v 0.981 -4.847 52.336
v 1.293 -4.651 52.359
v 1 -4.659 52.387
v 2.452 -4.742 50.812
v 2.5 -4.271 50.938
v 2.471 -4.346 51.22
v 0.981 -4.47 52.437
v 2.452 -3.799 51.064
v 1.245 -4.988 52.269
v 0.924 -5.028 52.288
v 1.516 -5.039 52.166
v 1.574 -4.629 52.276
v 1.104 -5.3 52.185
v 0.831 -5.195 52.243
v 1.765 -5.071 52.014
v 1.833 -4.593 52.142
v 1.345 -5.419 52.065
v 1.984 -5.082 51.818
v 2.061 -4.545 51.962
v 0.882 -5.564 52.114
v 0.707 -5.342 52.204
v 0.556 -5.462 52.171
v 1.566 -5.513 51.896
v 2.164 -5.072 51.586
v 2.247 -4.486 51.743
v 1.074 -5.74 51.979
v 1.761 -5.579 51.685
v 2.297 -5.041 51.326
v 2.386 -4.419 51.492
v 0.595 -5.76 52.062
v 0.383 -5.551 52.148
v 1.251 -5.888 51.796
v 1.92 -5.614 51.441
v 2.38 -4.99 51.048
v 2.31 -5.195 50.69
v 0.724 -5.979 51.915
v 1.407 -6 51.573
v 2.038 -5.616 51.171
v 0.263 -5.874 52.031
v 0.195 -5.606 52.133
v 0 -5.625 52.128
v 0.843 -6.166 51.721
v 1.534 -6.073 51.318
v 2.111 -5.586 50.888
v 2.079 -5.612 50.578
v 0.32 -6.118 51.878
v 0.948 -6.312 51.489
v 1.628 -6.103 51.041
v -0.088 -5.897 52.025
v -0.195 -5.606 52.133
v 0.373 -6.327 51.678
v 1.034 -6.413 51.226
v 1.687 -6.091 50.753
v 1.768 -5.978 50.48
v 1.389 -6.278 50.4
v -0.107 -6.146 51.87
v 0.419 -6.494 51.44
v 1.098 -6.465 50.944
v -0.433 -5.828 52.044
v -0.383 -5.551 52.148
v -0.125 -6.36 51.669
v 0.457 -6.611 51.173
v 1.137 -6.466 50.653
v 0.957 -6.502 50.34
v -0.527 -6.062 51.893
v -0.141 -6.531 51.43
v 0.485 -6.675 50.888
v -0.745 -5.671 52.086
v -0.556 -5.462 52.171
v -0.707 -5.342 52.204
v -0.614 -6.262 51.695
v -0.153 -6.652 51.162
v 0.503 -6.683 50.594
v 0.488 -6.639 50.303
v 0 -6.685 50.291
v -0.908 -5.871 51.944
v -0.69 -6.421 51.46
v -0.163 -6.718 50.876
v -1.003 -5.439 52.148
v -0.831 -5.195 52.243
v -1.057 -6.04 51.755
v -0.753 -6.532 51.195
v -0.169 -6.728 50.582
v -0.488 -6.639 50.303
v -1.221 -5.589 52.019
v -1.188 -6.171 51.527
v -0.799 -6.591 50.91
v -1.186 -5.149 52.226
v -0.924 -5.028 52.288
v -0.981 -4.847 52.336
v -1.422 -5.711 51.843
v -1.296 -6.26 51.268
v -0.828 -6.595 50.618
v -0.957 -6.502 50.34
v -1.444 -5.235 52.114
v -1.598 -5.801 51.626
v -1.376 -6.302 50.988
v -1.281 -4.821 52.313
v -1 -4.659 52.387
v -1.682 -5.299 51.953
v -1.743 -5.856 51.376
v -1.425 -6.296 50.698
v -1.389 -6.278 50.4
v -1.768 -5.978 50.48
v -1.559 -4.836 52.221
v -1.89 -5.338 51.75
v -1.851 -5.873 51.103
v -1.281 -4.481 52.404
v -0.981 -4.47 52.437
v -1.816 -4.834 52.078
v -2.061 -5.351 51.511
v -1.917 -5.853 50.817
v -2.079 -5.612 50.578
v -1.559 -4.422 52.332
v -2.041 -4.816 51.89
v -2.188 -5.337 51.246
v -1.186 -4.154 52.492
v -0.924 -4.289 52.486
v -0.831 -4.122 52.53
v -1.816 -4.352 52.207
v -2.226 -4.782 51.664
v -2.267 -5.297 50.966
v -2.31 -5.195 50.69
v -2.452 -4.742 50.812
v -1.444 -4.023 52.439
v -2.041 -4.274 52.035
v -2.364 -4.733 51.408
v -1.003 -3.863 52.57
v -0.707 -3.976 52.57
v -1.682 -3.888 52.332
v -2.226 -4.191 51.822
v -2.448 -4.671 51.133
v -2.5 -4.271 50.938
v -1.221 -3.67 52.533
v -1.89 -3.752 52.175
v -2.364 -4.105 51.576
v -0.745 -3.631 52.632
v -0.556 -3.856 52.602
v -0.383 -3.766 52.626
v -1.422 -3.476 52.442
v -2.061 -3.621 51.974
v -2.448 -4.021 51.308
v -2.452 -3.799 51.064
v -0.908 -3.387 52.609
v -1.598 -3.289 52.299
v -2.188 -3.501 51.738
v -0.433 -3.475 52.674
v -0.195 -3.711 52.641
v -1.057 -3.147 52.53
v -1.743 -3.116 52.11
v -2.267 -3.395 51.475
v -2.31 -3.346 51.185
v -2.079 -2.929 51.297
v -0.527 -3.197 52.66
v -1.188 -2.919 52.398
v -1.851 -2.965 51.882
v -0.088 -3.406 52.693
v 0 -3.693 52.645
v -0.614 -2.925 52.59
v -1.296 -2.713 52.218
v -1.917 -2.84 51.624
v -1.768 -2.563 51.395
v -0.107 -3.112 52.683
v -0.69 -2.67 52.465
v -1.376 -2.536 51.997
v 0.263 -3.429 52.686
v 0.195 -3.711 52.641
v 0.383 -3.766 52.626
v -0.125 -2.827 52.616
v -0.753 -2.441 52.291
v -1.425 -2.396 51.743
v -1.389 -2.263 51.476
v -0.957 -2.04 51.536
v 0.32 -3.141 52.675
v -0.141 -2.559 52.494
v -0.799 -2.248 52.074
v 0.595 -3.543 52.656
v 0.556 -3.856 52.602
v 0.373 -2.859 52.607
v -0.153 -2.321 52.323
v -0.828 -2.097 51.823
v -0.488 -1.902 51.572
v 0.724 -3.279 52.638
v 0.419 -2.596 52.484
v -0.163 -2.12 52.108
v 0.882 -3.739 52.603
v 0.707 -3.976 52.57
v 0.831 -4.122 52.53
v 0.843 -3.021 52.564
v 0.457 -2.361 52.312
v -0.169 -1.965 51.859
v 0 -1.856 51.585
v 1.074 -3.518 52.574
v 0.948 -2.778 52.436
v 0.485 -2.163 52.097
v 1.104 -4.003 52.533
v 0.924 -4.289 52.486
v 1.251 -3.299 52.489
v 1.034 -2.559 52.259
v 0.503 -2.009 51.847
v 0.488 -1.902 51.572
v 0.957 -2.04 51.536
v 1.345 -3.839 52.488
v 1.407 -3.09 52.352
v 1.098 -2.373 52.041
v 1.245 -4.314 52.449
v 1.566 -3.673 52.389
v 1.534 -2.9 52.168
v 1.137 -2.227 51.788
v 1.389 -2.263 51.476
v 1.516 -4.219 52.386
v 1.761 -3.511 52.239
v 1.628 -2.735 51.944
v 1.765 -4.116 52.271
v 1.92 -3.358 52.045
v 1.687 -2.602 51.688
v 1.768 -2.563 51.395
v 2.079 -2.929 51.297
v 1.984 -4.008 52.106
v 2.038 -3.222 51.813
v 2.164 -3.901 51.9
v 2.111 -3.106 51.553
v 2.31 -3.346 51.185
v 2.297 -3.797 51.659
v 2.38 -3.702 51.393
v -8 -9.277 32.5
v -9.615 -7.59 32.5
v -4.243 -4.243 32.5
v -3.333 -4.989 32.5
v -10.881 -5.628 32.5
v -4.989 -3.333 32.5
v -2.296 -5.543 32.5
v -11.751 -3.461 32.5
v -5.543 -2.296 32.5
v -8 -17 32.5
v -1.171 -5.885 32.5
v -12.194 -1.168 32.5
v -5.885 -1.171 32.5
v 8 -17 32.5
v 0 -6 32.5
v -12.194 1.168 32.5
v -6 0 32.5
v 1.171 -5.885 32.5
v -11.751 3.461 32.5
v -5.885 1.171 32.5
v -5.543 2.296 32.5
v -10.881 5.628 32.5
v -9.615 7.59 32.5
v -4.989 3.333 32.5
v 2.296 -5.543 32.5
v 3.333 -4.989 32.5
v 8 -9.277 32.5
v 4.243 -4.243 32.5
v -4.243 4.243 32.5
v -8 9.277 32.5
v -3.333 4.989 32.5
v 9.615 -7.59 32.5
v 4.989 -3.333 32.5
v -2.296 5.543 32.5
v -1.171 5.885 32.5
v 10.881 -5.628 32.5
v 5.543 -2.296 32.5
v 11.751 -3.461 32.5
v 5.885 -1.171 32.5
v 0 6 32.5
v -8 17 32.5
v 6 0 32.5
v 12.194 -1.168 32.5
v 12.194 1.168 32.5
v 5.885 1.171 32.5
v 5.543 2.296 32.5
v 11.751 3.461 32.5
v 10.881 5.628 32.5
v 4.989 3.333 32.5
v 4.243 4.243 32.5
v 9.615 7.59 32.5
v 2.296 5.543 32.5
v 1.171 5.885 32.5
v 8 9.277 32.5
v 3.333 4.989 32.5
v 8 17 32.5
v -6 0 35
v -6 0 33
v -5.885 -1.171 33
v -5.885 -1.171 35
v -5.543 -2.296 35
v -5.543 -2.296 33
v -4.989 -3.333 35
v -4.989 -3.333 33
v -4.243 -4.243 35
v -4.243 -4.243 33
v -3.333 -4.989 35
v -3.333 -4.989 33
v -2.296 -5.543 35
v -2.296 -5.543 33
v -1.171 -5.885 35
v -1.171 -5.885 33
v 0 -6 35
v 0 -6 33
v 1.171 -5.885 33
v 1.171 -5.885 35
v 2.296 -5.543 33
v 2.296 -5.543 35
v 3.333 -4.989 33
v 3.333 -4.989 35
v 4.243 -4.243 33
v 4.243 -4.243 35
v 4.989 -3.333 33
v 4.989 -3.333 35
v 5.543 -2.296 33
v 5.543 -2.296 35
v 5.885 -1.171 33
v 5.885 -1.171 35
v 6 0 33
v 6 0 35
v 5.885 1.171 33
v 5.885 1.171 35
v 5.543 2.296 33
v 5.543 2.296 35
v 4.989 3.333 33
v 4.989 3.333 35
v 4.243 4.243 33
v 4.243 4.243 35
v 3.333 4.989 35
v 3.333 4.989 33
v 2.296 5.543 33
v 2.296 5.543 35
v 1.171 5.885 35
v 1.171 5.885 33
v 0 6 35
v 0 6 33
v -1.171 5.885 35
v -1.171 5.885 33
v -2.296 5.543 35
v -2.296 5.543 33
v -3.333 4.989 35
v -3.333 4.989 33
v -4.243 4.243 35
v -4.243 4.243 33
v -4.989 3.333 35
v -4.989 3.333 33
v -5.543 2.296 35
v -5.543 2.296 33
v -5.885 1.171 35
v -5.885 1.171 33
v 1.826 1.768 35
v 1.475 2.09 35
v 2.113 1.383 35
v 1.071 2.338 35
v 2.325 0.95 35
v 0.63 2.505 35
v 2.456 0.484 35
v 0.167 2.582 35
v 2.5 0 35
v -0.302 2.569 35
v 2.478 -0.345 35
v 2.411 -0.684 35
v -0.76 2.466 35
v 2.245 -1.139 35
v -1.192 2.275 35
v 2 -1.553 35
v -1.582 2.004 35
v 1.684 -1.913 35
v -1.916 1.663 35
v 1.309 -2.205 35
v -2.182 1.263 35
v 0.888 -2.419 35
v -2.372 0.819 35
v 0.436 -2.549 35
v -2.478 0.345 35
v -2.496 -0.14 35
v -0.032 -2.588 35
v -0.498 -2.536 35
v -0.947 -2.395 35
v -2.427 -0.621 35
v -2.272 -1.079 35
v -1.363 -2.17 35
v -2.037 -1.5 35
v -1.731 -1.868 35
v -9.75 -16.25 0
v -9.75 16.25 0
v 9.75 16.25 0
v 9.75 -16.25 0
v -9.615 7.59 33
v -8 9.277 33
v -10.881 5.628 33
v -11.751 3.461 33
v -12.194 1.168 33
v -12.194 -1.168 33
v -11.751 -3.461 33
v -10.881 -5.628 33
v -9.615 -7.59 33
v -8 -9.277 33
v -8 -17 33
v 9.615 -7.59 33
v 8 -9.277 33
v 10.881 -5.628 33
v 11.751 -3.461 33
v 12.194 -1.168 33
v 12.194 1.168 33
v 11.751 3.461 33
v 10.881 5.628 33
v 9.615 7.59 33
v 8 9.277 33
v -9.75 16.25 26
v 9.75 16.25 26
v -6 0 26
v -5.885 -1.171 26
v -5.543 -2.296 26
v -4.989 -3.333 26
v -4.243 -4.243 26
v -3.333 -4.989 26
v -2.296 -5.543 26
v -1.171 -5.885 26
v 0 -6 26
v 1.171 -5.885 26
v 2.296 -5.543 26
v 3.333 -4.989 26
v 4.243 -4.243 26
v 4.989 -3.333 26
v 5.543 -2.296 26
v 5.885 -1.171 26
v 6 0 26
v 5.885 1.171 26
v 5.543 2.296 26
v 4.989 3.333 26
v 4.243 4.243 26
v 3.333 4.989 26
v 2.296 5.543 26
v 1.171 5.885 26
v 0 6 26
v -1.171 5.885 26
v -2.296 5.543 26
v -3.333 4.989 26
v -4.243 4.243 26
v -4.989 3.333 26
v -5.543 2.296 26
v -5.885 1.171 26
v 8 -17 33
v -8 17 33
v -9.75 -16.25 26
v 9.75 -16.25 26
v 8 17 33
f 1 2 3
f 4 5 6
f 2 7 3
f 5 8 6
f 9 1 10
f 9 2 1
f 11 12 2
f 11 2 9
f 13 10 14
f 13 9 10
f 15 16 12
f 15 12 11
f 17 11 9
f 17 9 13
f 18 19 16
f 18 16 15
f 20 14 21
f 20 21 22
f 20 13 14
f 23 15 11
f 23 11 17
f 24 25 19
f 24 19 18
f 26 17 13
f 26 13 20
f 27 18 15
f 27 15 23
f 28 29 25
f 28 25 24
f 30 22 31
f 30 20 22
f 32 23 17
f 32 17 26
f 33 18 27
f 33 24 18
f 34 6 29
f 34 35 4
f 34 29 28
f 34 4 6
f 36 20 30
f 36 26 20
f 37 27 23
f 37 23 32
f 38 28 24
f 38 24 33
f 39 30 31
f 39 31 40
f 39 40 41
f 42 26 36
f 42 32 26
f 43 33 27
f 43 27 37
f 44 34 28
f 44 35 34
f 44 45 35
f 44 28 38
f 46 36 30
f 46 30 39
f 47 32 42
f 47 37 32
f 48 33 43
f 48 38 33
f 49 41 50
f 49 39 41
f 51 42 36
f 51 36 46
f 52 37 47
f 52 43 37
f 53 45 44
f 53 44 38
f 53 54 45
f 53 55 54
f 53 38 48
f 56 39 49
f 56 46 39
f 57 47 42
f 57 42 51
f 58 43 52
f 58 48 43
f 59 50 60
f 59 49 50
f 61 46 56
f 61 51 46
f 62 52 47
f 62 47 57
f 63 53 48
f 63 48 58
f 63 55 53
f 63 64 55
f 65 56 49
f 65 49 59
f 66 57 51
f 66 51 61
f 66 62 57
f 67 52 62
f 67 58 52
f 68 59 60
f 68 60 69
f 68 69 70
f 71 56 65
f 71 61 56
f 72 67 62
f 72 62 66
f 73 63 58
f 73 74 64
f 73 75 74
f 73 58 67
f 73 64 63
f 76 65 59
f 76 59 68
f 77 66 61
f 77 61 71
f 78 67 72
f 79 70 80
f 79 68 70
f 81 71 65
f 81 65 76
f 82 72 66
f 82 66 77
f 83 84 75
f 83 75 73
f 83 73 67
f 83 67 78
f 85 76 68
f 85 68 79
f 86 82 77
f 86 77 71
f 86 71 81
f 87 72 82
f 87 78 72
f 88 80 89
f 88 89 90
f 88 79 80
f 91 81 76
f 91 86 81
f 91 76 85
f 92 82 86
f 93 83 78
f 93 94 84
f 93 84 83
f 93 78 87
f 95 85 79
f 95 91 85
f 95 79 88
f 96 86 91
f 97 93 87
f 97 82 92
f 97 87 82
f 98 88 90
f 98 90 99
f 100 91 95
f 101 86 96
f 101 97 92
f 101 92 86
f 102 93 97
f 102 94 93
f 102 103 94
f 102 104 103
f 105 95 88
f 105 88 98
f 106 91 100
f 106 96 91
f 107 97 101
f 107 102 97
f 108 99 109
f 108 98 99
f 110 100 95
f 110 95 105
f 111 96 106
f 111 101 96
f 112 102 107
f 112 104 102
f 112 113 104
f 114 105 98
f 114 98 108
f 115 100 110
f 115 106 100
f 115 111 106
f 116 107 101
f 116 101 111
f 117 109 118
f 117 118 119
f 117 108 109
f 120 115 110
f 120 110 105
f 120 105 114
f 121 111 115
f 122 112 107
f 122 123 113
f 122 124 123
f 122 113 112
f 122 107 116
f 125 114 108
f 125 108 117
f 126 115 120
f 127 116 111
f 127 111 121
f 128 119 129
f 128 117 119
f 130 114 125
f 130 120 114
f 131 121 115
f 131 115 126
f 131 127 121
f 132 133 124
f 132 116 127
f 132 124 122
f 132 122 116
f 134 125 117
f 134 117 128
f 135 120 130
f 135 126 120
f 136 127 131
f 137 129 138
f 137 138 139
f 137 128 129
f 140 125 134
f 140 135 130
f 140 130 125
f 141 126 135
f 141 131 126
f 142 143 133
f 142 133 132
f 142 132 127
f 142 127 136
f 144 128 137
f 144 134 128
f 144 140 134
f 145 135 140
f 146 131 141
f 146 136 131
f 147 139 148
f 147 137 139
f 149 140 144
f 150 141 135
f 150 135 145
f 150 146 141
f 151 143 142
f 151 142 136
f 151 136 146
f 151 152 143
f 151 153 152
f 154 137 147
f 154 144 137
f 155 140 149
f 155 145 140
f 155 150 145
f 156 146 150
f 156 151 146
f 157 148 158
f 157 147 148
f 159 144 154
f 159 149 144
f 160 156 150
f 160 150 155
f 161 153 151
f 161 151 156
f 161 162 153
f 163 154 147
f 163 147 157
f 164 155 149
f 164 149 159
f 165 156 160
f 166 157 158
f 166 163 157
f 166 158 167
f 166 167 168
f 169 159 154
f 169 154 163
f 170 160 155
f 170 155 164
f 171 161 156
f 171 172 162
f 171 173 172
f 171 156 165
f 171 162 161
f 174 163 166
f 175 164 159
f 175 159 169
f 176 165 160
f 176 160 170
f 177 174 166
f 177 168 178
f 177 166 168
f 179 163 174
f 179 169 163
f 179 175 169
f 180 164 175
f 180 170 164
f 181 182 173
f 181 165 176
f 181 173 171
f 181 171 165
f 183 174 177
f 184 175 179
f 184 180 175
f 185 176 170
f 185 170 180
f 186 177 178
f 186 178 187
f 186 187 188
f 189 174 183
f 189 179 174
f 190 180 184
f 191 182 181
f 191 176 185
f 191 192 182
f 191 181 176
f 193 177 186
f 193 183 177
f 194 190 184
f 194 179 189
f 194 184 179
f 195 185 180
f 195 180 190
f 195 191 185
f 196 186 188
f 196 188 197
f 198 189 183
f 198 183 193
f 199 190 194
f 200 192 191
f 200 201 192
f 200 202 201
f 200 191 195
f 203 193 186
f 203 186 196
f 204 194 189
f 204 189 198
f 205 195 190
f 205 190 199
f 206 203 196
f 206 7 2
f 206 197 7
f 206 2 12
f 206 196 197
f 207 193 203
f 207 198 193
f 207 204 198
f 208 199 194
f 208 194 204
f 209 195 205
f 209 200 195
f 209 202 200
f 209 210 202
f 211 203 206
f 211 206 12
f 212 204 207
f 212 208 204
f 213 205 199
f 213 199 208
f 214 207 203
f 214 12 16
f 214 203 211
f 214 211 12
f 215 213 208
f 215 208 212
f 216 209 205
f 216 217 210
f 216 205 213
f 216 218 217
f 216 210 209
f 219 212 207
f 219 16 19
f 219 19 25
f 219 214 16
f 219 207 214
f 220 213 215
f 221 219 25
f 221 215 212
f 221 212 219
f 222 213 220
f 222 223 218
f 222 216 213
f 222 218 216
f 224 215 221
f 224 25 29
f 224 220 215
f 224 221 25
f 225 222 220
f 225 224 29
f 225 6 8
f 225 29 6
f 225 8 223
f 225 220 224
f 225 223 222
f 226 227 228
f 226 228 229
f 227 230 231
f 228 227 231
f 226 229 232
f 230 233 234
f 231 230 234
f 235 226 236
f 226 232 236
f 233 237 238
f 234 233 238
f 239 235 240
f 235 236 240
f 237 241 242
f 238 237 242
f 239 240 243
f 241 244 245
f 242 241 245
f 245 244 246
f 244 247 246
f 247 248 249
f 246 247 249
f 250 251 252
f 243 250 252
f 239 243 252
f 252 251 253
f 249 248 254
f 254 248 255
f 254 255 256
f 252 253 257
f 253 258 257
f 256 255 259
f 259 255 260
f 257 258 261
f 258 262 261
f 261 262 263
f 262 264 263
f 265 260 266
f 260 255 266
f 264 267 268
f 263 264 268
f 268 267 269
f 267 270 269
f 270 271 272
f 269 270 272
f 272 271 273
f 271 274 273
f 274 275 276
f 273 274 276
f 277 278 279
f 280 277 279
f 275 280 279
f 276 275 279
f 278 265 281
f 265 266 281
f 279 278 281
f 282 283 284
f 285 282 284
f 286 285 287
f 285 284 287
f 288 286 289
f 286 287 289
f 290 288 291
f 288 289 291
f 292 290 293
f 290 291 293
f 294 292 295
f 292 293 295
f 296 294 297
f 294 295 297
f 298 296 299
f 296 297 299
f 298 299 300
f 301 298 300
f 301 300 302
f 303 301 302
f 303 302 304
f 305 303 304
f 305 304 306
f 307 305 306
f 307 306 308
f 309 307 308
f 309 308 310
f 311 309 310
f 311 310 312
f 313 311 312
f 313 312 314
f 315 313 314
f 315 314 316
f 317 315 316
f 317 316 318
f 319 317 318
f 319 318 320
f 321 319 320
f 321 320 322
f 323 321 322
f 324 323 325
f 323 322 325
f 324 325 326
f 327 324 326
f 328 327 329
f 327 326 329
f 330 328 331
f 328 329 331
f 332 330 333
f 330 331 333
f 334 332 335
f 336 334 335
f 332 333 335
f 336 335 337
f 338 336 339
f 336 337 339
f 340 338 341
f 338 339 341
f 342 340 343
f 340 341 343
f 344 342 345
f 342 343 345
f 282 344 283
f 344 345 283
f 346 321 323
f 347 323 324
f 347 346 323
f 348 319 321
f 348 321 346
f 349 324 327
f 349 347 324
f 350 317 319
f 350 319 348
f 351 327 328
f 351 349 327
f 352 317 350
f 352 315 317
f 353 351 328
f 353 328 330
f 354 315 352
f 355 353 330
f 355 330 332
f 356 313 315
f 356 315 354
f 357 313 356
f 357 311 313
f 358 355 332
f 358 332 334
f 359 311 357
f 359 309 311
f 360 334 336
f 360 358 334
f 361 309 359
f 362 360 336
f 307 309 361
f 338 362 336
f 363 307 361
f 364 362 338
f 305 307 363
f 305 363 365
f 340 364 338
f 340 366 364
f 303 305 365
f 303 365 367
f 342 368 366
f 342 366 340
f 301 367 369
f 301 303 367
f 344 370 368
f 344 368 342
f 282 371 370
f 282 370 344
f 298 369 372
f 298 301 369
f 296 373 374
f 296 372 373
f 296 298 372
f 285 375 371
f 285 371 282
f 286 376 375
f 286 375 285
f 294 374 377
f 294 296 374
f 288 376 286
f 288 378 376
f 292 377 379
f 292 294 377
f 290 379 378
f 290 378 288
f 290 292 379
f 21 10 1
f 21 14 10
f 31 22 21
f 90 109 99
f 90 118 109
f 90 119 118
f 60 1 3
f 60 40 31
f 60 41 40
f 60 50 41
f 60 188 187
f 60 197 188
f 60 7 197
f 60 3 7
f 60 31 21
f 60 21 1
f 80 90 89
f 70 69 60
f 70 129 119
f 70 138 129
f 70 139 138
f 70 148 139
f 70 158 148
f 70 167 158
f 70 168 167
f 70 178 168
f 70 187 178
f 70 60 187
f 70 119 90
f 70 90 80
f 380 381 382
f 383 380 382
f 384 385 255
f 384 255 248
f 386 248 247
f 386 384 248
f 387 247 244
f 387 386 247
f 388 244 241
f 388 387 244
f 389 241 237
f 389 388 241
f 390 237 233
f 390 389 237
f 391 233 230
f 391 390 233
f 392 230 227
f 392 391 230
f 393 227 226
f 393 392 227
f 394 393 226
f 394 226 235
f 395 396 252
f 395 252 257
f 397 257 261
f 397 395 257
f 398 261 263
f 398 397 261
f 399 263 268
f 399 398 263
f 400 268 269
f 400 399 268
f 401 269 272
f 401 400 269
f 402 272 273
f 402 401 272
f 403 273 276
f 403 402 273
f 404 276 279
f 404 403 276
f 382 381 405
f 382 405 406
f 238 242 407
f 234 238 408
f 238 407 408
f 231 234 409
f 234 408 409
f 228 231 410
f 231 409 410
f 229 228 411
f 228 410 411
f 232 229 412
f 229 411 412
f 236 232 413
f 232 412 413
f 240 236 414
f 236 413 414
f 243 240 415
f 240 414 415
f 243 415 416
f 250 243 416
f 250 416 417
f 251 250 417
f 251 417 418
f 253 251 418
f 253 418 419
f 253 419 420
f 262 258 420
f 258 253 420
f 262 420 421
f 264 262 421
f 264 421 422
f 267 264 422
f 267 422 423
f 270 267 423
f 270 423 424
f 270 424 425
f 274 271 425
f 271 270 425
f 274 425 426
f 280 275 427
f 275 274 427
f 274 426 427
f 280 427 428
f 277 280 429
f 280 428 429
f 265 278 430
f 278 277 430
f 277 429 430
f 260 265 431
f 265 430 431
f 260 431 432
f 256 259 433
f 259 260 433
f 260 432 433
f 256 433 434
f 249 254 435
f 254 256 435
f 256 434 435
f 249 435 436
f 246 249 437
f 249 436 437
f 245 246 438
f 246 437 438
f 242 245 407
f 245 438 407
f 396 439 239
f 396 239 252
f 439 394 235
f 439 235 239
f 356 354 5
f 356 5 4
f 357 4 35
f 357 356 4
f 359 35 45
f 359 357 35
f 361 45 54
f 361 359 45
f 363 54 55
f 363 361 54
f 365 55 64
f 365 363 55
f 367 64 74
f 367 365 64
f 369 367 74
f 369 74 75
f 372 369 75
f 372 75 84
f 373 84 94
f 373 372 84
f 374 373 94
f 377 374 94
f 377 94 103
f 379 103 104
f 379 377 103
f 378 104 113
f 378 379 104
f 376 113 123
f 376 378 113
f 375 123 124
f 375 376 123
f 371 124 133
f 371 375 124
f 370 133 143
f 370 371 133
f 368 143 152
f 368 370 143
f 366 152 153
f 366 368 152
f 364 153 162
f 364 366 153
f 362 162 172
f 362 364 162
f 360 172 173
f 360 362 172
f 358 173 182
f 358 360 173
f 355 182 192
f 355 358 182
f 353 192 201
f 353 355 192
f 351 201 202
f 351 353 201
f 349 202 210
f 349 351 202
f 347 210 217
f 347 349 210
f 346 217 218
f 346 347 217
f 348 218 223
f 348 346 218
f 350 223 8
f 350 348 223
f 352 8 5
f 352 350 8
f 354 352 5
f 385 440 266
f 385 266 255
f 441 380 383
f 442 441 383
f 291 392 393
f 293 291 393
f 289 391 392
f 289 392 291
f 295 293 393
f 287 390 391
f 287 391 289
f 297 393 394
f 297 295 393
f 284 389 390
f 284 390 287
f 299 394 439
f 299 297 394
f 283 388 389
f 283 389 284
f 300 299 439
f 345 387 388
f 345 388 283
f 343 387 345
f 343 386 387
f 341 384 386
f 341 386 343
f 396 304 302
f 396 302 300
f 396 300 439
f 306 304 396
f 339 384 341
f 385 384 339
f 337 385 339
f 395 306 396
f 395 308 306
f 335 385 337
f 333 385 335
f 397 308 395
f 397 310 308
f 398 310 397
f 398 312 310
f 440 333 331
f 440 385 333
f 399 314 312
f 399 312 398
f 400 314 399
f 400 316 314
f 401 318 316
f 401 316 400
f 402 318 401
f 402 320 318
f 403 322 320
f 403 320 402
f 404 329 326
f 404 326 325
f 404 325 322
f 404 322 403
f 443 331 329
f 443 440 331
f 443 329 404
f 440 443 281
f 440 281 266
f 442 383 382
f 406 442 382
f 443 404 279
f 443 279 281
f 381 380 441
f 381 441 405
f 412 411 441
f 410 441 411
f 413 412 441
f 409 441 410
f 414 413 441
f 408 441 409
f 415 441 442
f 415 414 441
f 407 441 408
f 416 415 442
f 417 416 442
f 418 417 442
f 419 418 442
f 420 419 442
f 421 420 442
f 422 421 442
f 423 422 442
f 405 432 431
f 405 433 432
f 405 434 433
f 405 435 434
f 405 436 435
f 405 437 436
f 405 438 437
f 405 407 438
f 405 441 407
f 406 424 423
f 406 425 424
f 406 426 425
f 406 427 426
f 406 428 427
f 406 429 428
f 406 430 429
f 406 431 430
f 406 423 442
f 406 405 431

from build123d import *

# Parameters (mm, degrees)
SKETCH1_W           = 19.5
SKETCH1_H           = 32.5
BOSS_EXTRUDE1_DEPTH = 26
SKETCH2_R           = 6
BOSS_EXTRUDE2_DEPTH = 9
BOSS_EXTRUDE3_START = -2
BOSS_EXTRUDE3_DEPTH = 0.5
SWEEP1_OUTLINE_W    = 2.5
SWEEP1_OUTLINE_H    = 18.679041634
FILLET1_R           = 1.5


# Read off the part's stored shape, not the designer's step: Sweep1
with BuildPart() as part:
    # Sketch1 → Boss-Extrude1 (new body)
    with BuildSketch(Plane.XY):
        Rectangle(SKETCH1_W, SKETCH1_H)
    extrude(amount=BOSS_EXTRUDE1_DEPTH)

    # Sketch2 → Boss-Extrude2 (add)
    with BuildSketch(Plane.XY.offset(26)):
        with Locations(Location((0, 0, 0), (0, 0, 180))):
            Circle(SKETCH2_R)
    extrude(amount=BOSS_EXTRUDE2_DEPTH)

    # Sketch3 → Boss-Extrude3 (add)
    with BuildSketch(Plane.XY.offset(35).offset(BOSS_EXTRUDE3_START)):
        with BuildLine():
            Line((8, 9.276987658), (8, 17))
            Line((8, 17), (-8, 17))
            Line((-8, 17), (-8, 9.276987658))
            ThreePointArc((-8, 9.276987658), (-12.25, 0), (-8, -9.276987658))
            Line((-8, -9.276987658), (-8, -17))
            Line((-8, -17), (8, -17))
            Line((8, -17), (8, -9.276987658))
            ThreePointArc((8, -9.276987658), (12.25, 0), (8, 9.276987658))
        make_face()
    extrude(amount=-BOSS_EXTRUDE3_DEPTH)

    # Sweep1 outline → Sweep1 (revolve)
    with BuildSketch(Plane(origin=(0, 8.75, 2.344555434), x_dir=(1, 0, 0), z_dir=(0, 0.965925826289068, 0.258819045102522))):
        with Locations((1.25, -42.467883103)):
            Rectangle(SWEEP1_OUTLINE_W, SWEEP1_OUTLINE_H)
    revolve(axis=Axis((0, 8.75, 2.344555434), (0, 0.258819045102522, -0.965925826289068)))

    # Fillet1
    fillet1_edges = [part.edges().sort_by_distance(p)[0] for p in [
        (-2.5, -4.658742812, 52.386664873),
    ]]
    fillet(fillet1_edges, radius=FILLET1_R)


solid = part.part
